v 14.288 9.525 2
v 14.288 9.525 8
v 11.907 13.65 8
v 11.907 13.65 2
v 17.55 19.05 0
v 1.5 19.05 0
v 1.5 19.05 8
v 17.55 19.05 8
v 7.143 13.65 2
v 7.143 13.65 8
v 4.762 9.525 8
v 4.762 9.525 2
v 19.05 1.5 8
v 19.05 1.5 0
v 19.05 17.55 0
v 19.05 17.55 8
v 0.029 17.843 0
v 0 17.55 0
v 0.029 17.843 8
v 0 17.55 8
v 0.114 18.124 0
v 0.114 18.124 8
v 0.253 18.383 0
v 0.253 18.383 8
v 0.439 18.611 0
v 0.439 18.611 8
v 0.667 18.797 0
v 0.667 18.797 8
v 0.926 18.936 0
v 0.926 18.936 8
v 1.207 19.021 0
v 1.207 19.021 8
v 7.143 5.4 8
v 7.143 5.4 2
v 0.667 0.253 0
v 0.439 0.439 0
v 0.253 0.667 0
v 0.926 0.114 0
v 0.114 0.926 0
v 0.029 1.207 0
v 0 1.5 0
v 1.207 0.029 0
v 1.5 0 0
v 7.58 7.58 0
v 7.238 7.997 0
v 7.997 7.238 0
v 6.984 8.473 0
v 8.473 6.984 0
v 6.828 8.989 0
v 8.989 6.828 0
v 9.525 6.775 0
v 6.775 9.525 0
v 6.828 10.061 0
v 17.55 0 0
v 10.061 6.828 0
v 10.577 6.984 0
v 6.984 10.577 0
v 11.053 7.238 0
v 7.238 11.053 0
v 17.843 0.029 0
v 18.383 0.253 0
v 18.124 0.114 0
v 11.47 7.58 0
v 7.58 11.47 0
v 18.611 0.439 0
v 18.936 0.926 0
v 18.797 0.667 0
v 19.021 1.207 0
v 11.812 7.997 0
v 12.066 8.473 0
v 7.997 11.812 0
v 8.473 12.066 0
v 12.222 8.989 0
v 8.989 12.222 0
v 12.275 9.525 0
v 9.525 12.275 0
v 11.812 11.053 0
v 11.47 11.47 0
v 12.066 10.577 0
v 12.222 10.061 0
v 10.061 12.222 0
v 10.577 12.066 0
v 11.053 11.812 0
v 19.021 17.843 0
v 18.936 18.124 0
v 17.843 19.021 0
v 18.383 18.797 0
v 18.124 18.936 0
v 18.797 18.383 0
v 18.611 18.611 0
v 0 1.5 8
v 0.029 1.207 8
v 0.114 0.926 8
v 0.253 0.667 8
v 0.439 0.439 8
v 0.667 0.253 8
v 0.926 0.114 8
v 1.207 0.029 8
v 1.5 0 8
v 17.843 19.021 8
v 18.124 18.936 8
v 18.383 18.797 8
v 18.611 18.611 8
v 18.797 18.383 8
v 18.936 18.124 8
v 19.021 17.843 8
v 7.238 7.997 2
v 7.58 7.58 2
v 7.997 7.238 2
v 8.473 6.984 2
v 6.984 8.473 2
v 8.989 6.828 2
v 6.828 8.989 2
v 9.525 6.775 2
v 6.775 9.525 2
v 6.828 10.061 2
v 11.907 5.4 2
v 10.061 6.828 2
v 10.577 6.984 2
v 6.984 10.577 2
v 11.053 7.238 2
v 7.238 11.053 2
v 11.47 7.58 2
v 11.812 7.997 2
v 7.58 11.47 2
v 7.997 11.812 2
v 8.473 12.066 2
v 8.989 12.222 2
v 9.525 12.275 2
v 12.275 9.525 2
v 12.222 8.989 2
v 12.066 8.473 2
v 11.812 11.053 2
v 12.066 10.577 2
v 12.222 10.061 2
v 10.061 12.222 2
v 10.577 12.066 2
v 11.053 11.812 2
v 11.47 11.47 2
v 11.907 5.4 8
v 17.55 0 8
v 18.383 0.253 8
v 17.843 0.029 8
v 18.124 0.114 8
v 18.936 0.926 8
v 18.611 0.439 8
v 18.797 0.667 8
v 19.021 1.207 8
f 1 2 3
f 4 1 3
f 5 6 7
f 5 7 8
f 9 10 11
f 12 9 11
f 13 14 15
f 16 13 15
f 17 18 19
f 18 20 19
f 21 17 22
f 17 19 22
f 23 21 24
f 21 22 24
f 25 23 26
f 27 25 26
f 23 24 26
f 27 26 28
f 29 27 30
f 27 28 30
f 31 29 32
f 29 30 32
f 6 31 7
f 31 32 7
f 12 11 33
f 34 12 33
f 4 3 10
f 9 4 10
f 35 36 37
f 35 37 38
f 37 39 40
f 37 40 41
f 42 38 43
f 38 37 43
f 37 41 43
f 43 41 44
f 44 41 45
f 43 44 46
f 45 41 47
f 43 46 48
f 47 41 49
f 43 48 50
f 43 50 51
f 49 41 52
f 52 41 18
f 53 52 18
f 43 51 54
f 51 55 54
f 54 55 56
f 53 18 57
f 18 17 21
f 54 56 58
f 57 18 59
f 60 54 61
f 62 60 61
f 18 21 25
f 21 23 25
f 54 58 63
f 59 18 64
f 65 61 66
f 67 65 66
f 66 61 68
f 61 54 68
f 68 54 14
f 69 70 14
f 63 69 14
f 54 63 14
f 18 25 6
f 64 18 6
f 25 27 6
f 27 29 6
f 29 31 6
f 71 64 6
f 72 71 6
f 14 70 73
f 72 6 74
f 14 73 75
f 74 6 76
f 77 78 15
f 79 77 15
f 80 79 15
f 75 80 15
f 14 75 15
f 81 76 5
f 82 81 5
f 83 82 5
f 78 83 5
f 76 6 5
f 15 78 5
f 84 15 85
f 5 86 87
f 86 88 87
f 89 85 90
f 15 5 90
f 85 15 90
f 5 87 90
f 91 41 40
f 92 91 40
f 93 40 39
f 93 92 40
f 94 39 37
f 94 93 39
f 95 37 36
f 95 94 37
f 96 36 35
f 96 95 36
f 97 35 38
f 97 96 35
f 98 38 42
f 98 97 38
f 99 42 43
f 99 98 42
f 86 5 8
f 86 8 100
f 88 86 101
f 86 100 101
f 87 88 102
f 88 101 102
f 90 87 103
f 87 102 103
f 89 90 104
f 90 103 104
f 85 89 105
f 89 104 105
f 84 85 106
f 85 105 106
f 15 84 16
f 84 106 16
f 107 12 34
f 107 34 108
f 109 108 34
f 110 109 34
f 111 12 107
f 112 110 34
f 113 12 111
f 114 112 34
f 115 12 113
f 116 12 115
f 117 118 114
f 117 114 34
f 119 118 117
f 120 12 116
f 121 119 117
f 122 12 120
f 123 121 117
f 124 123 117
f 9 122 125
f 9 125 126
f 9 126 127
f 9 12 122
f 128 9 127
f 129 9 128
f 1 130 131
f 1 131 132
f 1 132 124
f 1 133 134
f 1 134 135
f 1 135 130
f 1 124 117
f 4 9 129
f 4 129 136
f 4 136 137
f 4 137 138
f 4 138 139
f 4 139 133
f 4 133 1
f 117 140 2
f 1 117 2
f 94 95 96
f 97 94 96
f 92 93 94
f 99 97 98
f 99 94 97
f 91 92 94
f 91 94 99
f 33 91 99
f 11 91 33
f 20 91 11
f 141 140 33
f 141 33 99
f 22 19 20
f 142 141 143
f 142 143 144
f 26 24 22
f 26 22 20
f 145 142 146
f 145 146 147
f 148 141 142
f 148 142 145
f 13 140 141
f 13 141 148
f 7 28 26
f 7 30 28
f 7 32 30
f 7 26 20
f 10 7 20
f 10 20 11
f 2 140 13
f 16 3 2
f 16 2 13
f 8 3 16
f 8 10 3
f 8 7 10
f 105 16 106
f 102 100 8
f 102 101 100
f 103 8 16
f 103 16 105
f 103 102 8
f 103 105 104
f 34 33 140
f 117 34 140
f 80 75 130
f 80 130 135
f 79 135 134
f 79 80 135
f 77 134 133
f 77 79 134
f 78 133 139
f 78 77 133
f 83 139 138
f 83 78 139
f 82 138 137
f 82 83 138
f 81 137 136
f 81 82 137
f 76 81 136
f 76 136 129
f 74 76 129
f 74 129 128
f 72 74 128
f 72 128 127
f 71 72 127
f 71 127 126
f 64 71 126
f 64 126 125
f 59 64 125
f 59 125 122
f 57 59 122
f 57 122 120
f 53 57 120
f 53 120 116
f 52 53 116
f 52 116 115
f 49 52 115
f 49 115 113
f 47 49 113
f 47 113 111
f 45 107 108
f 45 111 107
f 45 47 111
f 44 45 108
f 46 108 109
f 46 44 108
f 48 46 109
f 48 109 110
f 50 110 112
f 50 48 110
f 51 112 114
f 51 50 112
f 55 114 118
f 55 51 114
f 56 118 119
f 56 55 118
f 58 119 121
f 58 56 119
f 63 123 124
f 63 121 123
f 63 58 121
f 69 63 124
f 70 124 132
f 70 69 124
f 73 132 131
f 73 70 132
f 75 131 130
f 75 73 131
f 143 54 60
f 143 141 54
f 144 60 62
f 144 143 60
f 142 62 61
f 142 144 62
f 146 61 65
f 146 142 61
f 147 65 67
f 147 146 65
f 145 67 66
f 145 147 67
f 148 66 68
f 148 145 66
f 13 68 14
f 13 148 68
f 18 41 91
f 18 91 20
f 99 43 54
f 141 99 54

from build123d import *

# Parameters (mm, degrees)
SKETCH1_W               = 19.05
SKETCH1_H               = 19.05
BOSS_EXTRUDE1_DEPTH     = 8
SKETCH2_R               = 2.75
CUT_EXTRUDE1_DEPTH      = 6
CUT_EXTRUDE2_DEPTH      = 29.103469537
CUT_EXTRUDE2_DEPTH_BACK = 29.103469537
SKETCH2_3_R             = 2.75
FILLET1_R               = 1.5


with BuildPart() as part:
    # Sketch1 → Boss-Extrude1 (new body)
    with BuildSketch(Plane.XY):
        with Locations((9.525, 9.525)):
            Rectangle(SKETCH1_W, SKETCH1_H)
    extrude(amount=BOSS_EXTRUDE1_DEPTH)

    # Sketch2 → Cut-Extrude1 (cut)
    # profile 1 of 2: a face of its own
    with BuildSketch(Plane.XY.offset(8)):
        Polygon((7.143430137, 5.399999995), (11.906569863, 5.399999995), (14.288139727, 9.525), (11.906569863, 13.650000005), (7.143430137, 13.650000005), (4.761860273, 9.525), align=None)
        with Locations((9.525, 9.525)):
            Circle(SKETCH2_R, mode=Mode.SUBTRACT)
    # profile 2 of 2: a face of its own
    with BuildSketch(Plane.XY.offset(8)):
        with Locations((9.525, 9.525)):
            Circle(SKETCH2_R)
    extrude(amount=-CUT_EXTRUDE1_DEPTH, mode=Mode.SUBTRACT)

    # Sketch2<3> → Cut-Extrude2 (cut, two sides: drawn at the far end of the back side and taken through both)
    with BuildSketch(Plane.XY.offset(8).offset(-CUT_EXTRUDE2_DEPTH_BACK)):
        with Locations((9.525, 9.525)):
            Circle(SKETCH2_3_R)
    extrude(amount=CUT_EXTRUDE2_DEPTH + CUT_EXTRUDE2_DEPTH_BACK, mode=Mode.SUBTRACT)

    # Fillet1
    fillet1_edges = [part.edges().sort_by_distance(p)[0] for p in [
        (0, 19.05, 4),
        (19.05, 19.05, 4),
        (19.05, 0, 4),
        (0, 0, 4),
    ]]
    fillet(fillet1_edges, radius=FILLET1_R)


solid = part.part
